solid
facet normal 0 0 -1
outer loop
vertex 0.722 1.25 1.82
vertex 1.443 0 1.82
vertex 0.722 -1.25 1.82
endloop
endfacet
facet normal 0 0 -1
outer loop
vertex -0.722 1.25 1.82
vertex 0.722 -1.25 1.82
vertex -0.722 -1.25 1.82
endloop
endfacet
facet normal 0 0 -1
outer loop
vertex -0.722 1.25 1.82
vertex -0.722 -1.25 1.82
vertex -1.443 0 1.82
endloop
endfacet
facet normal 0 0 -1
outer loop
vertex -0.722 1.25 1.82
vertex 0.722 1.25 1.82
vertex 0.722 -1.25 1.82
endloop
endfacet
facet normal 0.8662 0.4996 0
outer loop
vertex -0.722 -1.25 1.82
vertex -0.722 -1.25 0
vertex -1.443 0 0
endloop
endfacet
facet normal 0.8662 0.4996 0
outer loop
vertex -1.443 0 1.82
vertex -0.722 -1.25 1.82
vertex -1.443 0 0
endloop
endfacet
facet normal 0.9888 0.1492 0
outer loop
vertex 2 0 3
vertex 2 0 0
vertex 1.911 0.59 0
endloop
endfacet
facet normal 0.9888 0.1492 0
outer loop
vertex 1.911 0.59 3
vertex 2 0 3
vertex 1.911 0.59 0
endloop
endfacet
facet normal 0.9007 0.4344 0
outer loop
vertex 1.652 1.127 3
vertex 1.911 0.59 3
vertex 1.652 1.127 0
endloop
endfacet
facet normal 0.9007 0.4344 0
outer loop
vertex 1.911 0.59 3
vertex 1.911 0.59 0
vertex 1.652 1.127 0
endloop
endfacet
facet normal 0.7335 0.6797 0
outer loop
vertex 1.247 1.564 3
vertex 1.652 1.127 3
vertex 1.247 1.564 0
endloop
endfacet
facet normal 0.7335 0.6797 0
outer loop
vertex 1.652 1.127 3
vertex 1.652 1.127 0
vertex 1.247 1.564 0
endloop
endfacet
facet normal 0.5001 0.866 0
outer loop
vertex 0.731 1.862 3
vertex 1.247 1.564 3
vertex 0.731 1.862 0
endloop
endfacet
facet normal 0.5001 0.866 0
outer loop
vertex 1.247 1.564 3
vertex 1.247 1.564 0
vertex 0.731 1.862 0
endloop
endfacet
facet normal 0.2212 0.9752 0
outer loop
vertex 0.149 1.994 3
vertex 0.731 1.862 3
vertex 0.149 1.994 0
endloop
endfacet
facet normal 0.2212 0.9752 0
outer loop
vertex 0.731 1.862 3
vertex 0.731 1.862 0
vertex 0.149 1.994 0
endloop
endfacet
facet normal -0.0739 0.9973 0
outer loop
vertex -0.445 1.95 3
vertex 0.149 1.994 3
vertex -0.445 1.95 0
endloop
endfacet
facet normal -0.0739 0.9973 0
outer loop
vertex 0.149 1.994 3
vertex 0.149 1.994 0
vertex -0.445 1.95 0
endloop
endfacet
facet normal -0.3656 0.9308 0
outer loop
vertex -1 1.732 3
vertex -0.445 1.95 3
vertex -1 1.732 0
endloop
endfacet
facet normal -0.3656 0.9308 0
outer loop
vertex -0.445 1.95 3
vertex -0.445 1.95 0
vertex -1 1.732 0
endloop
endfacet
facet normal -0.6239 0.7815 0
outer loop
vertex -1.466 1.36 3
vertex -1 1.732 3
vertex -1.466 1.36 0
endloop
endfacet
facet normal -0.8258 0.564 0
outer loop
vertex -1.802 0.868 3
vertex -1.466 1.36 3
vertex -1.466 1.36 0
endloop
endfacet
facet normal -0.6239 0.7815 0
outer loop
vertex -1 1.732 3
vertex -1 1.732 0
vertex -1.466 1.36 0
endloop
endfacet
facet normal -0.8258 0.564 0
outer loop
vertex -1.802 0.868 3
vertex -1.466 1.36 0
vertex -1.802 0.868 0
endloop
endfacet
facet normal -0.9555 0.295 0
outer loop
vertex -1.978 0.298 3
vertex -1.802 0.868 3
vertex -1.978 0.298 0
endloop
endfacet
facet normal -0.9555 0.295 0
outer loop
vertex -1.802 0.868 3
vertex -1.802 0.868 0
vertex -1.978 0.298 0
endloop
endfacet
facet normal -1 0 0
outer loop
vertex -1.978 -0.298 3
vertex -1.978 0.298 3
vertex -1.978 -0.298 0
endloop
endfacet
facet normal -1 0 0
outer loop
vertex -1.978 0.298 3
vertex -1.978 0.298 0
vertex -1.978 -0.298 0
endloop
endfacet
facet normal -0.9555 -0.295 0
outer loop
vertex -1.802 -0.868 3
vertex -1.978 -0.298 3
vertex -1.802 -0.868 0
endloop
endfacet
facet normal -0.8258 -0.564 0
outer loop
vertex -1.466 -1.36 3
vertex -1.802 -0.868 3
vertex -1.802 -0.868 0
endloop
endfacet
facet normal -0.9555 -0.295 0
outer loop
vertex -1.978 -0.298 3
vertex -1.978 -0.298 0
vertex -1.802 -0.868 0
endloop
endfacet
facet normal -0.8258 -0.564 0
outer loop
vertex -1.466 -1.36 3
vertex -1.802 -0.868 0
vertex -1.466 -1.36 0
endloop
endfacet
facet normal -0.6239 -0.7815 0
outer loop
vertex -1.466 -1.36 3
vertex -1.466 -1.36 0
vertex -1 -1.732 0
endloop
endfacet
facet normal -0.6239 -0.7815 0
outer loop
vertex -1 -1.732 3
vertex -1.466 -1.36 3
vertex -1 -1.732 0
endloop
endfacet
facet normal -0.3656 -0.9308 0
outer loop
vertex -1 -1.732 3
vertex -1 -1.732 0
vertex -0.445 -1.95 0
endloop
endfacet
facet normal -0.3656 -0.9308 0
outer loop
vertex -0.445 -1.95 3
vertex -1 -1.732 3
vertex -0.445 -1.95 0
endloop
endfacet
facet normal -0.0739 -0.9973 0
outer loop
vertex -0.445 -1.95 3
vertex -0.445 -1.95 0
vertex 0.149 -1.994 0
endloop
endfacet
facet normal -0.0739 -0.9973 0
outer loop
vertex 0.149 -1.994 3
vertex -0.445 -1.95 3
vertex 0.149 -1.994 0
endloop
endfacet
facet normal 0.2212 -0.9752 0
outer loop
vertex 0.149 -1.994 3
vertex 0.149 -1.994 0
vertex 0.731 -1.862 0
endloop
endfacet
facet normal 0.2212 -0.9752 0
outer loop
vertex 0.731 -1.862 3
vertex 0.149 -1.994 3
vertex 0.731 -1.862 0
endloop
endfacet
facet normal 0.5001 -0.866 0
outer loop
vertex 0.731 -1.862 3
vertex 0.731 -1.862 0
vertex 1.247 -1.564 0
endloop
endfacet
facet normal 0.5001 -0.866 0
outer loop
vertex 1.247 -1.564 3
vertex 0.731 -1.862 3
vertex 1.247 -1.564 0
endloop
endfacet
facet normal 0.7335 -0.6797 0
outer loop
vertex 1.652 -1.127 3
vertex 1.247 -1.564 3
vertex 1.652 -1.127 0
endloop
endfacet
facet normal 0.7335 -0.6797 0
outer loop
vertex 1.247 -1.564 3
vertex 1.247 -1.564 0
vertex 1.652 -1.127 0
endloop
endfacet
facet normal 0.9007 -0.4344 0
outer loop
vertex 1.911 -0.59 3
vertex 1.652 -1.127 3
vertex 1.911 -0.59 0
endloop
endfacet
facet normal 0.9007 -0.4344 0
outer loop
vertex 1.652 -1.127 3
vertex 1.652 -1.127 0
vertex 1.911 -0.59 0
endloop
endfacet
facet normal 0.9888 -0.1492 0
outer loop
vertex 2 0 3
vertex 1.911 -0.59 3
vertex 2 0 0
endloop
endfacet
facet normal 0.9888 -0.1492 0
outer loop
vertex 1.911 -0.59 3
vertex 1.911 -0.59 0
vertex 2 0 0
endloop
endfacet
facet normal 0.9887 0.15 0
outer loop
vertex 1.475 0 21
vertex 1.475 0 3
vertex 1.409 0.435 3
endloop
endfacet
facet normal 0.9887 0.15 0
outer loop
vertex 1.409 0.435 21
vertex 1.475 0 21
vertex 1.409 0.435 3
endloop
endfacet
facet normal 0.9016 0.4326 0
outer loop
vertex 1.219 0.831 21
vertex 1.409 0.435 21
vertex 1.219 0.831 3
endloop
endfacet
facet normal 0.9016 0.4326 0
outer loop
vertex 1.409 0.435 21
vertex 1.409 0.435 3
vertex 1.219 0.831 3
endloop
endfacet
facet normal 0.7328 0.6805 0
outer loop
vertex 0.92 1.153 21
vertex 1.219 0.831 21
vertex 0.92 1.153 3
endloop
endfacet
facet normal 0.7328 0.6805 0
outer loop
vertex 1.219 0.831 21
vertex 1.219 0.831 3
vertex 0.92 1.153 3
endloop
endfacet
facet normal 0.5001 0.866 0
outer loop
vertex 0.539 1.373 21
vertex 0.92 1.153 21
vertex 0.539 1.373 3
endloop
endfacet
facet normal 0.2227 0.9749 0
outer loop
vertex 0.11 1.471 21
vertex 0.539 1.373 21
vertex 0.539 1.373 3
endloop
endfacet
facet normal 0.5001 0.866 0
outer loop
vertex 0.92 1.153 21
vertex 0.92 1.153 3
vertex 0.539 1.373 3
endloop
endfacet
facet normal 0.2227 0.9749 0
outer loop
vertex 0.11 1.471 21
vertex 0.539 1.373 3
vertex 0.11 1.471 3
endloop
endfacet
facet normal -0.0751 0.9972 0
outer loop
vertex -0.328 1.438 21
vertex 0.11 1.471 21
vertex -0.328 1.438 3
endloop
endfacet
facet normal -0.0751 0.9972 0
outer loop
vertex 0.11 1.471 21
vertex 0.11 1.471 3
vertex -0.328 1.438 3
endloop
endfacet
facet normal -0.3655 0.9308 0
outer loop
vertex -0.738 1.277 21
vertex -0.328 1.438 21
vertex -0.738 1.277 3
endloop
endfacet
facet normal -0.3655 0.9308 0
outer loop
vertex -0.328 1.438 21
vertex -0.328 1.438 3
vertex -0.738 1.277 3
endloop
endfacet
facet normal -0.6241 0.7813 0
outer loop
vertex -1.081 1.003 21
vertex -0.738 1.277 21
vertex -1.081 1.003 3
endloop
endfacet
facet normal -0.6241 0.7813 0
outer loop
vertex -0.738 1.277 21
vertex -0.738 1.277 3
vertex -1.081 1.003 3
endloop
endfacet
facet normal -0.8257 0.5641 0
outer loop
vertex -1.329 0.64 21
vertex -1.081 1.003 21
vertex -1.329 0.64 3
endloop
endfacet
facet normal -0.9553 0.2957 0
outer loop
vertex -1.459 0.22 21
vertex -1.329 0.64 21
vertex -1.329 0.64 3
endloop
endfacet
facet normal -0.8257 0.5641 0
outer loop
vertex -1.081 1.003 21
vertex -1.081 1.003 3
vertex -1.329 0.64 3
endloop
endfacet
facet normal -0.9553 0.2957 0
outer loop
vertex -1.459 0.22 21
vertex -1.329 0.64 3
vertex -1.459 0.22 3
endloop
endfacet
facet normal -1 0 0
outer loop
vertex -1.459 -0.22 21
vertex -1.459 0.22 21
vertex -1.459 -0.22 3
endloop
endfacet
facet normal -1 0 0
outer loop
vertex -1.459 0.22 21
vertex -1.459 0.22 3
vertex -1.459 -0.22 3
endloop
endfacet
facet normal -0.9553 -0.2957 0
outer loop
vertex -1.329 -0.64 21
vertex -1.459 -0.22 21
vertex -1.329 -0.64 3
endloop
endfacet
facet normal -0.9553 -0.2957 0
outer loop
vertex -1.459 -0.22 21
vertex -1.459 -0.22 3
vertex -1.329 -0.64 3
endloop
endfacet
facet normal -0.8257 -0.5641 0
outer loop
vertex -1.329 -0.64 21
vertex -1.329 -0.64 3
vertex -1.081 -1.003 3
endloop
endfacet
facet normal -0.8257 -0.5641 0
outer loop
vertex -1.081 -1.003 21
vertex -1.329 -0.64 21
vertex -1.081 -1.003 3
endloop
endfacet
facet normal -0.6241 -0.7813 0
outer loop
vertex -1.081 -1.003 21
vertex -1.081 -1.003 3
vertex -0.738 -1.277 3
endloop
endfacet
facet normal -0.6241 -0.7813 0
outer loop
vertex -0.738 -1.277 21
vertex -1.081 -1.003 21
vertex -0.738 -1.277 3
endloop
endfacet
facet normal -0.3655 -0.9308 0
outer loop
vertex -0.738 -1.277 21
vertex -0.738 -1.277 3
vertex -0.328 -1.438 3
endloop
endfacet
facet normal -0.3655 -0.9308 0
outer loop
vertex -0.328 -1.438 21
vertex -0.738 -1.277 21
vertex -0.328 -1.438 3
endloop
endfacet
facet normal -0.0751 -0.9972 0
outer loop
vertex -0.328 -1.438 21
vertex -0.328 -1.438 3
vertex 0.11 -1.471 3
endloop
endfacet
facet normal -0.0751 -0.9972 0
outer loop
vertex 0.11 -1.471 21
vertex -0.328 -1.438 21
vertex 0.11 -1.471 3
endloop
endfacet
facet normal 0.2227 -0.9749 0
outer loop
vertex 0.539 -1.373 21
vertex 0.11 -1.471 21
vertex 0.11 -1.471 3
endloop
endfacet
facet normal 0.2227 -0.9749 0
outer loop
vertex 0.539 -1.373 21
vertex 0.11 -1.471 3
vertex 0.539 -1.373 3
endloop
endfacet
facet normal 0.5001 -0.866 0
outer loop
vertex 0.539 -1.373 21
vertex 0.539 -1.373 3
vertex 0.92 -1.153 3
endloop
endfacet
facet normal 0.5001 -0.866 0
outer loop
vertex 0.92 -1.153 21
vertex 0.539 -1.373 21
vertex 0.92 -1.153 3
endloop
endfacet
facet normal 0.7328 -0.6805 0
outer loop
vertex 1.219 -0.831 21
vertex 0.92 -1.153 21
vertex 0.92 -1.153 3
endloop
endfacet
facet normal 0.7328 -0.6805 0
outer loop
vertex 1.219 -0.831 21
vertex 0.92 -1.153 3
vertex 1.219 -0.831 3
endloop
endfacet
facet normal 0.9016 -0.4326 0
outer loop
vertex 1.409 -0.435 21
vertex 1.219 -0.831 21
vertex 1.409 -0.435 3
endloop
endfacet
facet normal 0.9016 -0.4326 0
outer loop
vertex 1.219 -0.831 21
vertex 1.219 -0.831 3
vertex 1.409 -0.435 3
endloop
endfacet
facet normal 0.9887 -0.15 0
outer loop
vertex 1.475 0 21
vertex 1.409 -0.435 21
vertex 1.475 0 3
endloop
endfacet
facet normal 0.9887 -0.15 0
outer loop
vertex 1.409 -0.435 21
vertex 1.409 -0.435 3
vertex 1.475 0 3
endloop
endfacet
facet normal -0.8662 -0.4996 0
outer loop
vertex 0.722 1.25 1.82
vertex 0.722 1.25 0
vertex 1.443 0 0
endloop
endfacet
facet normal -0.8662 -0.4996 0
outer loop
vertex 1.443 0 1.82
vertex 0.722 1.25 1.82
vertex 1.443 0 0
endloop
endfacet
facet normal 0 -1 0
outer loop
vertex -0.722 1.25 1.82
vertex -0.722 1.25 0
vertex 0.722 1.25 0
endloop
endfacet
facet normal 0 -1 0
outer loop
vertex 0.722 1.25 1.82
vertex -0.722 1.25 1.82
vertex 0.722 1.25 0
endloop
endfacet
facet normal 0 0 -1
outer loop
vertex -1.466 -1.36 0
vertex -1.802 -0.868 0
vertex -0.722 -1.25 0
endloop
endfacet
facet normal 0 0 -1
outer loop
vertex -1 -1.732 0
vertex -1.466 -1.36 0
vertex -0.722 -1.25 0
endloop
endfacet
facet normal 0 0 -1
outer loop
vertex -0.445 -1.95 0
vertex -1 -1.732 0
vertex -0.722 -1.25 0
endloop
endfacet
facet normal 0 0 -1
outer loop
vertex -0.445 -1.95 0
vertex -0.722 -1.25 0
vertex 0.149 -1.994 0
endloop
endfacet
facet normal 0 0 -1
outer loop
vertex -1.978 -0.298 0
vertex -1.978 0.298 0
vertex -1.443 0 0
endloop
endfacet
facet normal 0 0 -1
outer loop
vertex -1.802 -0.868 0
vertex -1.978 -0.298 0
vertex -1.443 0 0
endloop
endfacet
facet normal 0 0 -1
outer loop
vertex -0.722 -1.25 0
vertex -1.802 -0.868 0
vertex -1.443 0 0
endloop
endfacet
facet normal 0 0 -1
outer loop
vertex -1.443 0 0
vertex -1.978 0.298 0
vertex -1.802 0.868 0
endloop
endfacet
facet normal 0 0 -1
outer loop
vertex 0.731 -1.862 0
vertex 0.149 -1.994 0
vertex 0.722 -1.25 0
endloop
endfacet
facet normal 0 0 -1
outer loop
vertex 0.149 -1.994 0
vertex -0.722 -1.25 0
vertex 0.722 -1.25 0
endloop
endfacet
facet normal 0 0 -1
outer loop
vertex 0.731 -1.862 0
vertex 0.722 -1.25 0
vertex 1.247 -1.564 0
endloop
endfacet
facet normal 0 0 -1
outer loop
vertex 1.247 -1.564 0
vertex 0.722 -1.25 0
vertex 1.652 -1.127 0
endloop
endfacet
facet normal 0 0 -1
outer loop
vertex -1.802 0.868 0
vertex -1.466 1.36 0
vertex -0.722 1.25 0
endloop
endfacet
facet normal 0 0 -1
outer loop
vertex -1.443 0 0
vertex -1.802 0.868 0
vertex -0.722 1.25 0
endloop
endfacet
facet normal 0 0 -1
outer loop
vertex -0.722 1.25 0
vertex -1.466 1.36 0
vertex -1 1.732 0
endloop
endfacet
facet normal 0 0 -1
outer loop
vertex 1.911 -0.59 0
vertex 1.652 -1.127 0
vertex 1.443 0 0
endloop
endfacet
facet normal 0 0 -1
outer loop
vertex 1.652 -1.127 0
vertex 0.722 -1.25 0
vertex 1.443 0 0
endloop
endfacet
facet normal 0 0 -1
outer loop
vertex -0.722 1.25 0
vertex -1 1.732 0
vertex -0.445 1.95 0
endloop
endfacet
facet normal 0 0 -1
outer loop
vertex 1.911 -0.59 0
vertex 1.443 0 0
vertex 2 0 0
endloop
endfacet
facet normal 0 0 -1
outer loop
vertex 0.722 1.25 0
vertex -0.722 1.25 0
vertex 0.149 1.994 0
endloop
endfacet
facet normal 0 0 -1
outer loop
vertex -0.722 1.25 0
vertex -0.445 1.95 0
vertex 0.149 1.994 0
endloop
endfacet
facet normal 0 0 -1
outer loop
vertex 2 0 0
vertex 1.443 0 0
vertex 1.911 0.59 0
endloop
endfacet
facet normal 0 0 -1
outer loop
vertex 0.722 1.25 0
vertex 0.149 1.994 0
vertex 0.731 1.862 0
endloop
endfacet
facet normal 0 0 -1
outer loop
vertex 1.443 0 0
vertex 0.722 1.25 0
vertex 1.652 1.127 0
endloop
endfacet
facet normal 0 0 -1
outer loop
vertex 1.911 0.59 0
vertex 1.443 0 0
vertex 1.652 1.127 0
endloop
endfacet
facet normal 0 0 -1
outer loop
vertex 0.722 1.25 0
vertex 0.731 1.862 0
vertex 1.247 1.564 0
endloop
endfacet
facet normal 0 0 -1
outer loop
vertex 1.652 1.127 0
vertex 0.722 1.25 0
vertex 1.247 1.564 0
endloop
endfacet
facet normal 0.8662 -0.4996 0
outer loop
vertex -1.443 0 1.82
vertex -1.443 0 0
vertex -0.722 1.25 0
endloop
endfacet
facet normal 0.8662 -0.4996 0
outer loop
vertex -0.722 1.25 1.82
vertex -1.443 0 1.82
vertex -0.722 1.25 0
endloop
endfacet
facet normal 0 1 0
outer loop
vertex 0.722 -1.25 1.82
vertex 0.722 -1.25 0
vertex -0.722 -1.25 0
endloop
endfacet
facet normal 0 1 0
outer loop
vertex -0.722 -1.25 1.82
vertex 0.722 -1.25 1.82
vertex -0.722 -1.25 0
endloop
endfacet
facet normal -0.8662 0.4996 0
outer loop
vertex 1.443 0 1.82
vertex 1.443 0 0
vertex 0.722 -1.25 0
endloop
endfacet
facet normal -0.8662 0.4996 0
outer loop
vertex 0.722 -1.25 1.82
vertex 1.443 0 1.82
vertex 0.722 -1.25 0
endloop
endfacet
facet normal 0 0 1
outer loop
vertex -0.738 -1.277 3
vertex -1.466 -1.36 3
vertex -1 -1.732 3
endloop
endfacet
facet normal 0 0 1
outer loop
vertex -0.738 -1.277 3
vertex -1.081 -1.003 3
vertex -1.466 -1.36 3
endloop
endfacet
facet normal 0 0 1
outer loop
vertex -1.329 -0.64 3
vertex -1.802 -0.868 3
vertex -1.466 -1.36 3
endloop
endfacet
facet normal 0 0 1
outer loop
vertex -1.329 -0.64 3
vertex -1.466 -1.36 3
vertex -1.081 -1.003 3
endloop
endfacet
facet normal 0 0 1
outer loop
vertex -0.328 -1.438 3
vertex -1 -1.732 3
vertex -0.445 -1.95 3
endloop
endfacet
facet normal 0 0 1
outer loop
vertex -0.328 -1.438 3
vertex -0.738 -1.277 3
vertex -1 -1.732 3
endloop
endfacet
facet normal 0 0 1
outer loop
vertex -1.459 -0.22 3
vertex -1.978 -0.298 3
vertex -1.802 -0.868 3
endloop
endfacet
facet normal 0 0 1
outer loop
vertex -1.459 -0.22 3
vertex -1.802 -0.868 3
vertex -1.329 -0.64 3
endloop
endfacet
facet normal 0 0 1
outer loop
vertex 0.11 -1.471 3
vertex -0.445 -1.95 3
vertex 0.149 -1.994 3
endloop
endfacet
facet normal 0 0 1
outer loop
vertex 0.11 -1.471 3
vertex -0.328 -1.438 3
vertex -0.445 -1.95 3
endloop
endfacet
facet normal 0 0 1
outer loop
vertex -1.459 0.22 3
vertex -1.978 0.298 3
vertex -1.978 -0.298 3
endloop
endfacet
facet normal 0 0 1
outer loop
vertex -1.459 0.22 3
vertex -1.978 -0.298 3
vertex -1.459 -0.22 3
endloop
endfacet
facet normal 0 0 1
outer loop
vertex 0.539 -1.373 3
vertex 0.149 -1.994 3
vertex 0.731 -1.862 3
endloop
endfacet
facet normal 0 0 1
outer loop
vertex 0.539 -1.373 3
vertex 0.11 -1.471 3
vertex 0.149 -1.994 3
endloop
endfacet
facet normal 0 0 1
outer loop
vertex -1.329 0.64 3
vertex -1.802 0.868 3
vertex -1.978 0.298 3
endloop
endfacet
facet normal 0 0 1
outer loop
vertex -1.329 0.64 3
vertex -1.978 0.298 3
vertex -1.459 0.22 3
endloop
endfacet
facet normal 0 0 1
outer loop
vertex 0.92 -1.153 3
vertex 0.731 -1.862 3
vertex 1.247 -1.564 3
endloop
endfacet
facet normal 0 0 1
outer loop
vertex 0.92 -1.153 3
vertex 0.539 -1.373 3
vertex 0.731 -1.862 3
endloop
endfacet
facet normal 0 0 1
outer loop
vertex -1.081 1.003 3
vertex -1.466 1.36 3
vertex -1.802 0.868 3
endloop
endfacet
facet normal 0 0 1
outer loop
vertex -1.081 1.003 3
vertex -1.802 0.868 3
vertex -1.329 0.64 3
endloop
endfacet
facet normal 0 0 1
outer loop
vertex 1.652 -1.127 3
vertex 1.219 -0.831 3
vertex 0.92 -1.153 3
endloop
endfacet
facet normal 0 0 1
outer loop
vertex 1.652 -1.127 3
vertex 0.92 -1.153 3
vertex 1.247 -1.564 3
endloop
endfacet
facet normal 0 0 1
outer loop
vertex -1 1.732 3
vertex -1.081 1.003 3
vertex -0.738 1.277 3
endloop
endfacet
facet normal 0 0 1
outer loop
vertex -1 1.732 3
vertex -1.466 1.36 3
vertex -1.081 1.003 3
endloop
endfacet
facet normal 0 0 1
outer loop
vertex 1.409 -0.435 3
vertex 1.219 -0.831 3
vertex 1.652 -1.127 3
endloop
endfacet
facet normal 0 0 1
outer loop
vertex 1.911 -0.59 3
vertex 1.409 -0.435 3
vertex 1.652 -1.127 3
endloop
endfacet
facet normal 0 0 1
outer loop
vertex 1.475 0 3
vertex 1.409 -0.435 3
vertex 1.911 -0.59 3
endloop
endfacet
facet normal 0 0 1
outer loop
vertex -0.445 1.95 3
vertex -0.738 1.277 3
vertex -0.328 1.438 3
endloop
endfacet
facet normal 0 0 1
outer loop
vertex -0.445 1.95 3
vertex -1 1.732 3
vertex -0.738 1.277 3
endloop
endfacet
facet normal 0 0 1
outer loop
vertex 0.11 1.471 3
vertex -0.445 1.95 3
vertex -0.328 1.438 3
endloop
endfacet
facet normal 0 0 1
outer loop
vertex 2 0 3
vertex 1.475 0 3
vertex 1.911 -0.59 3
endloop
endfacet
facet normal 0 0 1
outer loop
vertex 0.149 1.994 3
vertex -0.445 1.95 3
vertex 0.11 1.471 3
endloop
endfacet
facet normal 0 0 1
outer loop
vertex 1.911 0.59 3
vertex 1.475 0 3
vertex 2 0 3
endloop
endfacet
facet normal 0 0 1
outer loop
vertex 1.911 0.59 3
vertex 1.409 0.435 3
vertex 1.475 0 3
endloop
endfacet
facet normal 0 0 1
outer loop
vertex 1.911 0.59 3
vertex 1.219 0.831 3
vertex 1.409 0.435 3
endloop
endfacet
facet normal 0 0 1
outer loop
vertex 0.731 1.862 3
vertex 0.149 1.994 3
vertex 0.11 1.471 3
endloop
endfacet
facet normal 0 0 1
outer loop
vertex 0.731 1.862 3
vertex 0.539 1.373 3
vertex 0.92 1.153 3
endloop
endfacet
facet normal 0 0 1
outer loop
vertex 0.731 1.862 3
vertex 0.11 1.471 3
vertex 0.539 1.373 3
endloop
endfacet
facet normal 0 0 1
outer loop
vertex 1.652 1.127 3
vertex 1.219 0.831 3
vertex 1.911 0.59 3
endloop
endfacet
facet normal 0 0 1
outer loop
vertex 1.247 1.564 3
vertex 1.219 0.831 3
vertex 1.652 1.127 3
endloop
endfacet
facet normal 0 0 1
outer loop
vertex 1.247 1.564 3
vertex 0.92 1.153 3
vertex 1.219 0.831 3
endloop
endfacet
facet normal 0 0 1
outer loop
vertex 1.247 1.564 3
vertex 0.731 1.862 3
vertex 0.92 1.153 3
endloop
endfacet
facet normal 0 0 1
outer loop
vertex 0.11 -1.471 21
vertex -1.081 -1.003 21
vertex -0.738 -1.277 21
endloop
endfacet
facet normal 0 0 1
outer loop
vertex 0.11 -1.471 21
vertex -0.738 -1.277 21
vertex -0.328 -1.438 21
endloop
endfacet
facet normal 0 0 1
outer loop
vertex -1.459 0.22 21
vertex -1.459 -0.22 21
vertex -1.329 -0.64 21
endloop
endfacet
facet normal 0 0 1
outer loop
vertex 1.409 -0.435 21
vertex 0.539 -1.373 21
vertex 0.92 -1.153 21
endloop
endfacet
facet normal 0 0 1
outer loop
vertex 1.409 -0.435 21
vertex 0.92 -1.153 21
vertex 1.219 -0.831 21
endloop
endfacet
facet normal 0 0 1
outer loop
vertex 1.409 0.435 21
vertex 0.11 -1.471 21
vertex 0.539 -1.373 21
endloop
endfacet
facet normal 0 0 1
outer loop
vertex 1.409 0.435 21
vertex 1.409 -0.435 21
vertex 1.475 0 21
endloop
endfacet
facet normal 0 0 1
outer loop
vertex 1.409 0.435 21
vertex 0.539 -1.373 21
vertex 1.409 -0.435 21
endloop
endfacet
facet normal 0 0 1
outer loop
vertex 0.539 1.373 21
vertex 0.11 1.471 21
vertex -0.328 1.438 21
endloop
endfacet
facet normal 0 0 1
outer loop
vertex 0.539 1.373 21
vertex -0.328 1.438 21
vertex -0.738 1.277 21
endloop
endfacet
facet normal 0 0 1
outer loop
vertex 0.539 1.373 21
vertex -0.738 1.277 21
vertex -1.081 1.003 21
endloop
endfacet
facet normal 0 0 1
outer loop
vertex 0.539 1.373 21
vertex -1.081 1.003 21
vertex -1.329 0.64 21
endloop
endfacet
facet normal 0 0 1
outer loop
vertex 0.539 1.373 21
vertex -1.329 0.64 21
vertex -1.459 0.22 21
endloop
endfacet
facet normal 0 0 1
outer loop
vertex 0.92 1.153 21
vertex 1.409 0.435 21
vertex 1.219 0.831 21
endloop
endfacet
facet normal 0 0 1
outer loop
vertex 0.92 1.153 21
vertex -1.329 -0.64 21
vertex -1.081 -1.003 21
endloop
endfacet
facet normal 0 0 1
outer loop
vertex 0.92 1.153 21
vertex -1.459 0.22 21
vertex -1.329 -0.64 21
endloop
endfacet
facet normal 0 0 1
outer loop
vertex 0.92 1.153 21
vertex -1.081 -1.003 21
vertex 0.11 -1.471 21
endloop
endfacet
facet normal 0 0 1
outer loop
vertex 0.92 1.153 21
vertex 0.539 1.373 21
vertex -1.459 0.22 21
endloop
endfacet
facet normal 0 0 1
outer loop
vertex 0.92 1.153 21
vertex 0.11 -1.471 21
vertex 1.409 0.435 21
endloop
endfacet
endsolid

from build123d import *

# Parameters (mm, degrees)
SKETCH1_R      = 2
EXTRUDE1_DEPTH = 3
EXTRUDE3_DEPTH = 1.82
SKETCH2_R      = 1.475
EXTRUDE2_DEPTH = 18


with BuildPart() as part:
    # Sketch1 → Extrude1 (new body)
    with BuildSketch(Plane.XY):
        Circle(SKETCH1_R)
    extrude(amount=EXTRUDE1_DEPTH)

    # Sketch3 → Extrude3 (cut)
    with BuildSketch(Plane(origin=(0, 0, 0), x_dir=(-1, 0, 0), z_dir=(0, 0, -1))):
        Polygon((-1.443375673, 0), (-0.721687836, -1.25), (0.721687836, -1.25), (1.443375673, 0), (0.721687836, 1.25), (-0.721687836, 1.25), align=None)
    extrude(amount=-EXTRUDE3_DEPTH, mode=Mode.SUBTRACT)

    # Sketch2 → Extrude2 (add)
    with BuildSketch(Plane.XY.offset(3)):
        Circle(SKETCH2_R)
    extrude(amount=EXTRUDE2_DEPTH)


solid = part.part
